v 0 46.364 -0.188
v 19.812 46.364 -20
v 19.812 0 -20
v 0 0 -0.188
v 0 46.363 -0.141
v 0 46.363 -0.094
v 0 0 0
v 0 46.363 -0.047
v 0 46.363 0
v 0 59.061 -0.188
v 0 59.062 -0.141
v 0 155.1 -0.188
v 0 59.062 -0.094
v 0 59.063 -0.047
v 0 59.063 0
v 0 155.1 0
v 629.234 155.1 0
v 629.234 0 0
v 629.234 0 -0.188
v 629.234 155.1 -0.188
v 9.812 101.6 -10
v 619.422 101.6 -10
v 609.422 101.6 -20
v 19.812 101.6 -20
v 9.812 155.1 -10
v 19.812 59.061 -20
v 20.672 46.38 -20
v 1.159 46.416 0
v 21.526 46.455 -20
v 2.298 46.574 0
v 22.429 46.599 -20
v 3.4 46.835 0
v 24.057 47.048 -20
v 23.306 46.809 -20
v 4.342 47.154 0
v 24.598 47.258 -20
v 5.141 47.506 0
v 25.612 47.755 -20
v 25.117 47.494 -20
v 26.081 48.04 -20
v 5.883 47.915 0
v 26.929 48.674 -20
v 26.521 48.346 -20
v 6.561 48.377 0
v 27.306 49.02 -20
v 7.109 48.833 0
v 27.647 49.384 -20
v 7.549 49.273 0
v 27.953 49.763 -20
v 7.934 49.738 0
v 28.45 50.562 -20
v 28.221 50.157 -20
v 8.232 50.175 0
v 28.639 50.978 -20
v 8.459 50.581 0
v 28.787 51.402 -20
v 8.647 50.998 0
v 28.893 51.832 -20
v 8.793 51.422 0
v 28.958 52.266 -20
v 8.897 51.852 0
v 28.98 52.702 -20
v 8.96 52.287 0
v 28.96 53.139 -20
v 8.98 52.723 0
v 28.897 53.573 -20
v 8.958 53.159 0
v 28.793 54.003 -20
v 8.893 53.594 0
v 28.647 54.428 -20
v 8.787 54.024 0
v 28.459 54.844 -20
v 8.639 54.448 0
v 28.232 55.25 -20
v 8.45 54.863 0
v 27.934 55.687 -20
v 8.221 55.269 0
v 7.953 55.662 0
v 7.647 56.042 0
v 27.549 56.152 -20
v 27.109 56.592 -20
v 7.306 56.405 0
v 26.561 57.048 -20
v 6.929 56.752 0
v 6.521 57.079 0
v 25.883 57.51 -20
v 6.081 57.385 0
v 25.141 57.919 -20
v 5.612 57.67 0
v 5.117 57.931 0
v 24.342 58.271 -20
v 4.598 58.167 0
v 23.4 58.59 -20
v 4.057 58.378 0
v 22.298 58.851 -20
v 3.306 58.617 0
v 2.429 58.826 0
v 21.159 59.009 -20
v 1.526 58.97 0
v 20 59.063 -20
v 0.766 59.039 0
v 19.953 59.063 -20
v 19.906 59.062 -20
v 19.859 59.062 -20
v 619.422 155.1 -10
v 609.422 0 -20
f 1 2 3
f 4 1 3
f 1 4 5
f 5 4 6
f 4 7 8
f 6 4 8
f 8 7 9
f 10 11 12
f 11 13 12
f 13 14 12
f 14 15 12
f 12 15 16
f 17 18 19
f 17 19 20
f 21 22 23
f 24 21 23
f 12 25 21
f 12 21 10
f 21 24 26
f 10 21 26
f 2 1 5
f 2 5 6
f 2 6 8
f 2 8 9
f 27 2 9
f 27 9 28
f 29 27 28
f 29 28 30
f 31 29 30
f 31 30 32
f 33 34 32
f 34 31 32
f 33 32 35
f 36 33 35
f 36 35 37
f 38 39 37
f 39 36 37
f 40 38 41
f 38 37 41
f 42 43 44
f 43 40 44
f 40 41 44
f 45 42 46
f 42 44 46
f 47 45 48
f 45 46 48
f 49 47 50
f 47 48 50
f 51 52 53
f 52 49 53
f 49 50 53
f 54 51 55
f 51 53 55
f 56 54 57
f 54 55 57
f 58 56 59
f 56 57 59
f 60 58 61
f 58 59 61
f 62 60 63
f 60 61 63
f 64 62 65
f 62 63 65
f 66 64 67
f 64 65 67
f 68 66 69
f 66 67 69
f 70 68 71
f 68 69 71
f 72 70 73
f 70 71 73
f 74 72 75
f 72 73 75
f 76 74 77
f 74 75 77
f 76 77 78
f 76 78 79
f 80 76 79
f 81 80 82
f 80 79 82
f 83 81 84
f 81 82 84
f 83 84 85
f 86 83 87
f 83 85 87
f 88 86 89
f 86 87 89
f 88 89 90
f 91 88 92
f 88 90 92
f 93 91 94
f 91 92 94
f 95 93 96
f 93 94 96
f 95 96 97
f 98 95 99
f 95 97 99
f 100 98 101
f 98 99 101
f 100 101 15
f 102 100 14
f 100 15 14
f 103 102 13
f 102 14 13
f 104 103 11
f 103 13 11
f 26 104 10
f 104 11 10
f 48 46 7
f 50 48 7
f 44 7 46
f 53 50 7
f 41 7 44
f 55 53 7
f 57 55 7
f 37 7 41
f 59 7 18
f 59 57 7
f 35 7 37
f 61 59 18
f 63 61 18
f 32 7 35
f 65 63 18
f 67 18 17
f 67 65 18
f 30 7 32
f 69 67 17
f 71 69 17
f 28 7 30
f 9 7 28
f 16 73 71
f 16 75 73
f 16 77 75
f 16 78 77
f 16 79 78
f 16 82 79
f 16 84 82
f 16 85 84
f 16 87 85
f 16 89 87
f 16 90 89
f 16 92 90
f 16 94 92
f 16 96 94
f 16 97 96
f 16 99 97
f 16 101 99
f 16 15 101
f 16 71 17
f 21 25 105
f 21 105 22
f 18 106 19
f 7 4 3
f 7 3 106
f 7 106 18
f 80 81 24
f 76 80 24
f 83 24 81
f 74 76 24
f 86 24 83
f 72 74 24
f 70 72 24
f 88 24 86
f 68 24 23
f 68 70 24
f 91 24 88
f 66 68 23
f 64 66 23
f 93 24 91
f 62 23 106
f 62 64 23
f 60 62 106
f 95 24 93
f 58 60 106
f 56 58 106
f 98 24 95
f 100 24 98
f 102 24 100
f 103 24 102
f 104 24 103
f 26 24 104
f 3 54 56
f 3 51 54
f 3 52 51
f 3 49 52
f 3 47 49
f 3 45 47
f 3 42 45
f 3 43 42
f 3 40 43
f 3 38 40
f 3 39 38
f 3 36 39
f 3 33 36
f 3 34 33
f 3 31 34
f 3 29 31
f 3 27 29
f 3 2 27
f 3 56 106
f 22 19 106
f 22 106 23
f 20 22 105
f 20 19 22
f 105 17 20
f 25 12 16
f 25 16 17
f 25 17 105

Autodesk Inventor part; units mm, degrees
ref_plane "YZ Plane" through (0, 0, 0) normal (1, 0, 0) x (0, 1, 0)
ref_plane "XZ Plane" through (0, 0, 0) normal (0, 1, 0) x (-1, 0, 0)
sketch "Sketch1" plane through (0, 0, 0) normal (1, 0, 0) x (0, 1, 0)
  line L0 (0, 0) -> (155.1, 0)
  line L1 (155.1, 0) -> (155.1, -10)
  line L2 (0, -20) -> (0, 0)
  line L3 (155.1, -10) -> (101.6, -10)
  line L4 (101.6, -10) -> (101.6, -20)
  line L5 (101.6, -20) -> (0, -20)
  dimension "d0" = 53.5
  dimension "d1" = 155.1
  dimension "d2" = 10
  dimension "d3" = 10
  dimension "d4" = 20
extrude "Extrusion1" add sketch "Sketch1" along normal blind 629.2342
chamfer "Chamfer1" distance 19.812 angle 45 1 edges at (629.2342, 50.8, -20)
chamfer "Chamfer2" distance 19.812 angle 45 1 edges at (0, 50.8, -20)
ref_plane "Work Plane4" through (55.733, 38.0112, -55.921) normal (0.7071, 0, -0.7071) x (0, -1, 0)
sketch "Sketch3" plane through (55.733, 38.0112, -55.921) normal (0.7071, 0, -0.7071) x (0, -1, 0)
  line L0 (-63.5888, 0) -> (-63.5888, -416.9174) projected
  line L1 (-63.5888, 0) -> (38.0112, 0) projected
  line L2 (-117.0888, -0.1329) -> (-117.0888, -445.0687) projected
  line L3 (-117.0888, -0.1329) -> (-14.7014, -0.1329)
  line L4 (38.0112, -0.1329) -> (-117.0888, -0.1329) projected
  dimension "d18" = 102.3874
hole "Hole1" at (55.827, 52.7126, -55.827) direction (-0.7071, 0, 0.7071) diameter 12.7 depth 127 tip angle 118
properties part number "SkinnySideWidthOutlet" material "Wood (Birch)"
